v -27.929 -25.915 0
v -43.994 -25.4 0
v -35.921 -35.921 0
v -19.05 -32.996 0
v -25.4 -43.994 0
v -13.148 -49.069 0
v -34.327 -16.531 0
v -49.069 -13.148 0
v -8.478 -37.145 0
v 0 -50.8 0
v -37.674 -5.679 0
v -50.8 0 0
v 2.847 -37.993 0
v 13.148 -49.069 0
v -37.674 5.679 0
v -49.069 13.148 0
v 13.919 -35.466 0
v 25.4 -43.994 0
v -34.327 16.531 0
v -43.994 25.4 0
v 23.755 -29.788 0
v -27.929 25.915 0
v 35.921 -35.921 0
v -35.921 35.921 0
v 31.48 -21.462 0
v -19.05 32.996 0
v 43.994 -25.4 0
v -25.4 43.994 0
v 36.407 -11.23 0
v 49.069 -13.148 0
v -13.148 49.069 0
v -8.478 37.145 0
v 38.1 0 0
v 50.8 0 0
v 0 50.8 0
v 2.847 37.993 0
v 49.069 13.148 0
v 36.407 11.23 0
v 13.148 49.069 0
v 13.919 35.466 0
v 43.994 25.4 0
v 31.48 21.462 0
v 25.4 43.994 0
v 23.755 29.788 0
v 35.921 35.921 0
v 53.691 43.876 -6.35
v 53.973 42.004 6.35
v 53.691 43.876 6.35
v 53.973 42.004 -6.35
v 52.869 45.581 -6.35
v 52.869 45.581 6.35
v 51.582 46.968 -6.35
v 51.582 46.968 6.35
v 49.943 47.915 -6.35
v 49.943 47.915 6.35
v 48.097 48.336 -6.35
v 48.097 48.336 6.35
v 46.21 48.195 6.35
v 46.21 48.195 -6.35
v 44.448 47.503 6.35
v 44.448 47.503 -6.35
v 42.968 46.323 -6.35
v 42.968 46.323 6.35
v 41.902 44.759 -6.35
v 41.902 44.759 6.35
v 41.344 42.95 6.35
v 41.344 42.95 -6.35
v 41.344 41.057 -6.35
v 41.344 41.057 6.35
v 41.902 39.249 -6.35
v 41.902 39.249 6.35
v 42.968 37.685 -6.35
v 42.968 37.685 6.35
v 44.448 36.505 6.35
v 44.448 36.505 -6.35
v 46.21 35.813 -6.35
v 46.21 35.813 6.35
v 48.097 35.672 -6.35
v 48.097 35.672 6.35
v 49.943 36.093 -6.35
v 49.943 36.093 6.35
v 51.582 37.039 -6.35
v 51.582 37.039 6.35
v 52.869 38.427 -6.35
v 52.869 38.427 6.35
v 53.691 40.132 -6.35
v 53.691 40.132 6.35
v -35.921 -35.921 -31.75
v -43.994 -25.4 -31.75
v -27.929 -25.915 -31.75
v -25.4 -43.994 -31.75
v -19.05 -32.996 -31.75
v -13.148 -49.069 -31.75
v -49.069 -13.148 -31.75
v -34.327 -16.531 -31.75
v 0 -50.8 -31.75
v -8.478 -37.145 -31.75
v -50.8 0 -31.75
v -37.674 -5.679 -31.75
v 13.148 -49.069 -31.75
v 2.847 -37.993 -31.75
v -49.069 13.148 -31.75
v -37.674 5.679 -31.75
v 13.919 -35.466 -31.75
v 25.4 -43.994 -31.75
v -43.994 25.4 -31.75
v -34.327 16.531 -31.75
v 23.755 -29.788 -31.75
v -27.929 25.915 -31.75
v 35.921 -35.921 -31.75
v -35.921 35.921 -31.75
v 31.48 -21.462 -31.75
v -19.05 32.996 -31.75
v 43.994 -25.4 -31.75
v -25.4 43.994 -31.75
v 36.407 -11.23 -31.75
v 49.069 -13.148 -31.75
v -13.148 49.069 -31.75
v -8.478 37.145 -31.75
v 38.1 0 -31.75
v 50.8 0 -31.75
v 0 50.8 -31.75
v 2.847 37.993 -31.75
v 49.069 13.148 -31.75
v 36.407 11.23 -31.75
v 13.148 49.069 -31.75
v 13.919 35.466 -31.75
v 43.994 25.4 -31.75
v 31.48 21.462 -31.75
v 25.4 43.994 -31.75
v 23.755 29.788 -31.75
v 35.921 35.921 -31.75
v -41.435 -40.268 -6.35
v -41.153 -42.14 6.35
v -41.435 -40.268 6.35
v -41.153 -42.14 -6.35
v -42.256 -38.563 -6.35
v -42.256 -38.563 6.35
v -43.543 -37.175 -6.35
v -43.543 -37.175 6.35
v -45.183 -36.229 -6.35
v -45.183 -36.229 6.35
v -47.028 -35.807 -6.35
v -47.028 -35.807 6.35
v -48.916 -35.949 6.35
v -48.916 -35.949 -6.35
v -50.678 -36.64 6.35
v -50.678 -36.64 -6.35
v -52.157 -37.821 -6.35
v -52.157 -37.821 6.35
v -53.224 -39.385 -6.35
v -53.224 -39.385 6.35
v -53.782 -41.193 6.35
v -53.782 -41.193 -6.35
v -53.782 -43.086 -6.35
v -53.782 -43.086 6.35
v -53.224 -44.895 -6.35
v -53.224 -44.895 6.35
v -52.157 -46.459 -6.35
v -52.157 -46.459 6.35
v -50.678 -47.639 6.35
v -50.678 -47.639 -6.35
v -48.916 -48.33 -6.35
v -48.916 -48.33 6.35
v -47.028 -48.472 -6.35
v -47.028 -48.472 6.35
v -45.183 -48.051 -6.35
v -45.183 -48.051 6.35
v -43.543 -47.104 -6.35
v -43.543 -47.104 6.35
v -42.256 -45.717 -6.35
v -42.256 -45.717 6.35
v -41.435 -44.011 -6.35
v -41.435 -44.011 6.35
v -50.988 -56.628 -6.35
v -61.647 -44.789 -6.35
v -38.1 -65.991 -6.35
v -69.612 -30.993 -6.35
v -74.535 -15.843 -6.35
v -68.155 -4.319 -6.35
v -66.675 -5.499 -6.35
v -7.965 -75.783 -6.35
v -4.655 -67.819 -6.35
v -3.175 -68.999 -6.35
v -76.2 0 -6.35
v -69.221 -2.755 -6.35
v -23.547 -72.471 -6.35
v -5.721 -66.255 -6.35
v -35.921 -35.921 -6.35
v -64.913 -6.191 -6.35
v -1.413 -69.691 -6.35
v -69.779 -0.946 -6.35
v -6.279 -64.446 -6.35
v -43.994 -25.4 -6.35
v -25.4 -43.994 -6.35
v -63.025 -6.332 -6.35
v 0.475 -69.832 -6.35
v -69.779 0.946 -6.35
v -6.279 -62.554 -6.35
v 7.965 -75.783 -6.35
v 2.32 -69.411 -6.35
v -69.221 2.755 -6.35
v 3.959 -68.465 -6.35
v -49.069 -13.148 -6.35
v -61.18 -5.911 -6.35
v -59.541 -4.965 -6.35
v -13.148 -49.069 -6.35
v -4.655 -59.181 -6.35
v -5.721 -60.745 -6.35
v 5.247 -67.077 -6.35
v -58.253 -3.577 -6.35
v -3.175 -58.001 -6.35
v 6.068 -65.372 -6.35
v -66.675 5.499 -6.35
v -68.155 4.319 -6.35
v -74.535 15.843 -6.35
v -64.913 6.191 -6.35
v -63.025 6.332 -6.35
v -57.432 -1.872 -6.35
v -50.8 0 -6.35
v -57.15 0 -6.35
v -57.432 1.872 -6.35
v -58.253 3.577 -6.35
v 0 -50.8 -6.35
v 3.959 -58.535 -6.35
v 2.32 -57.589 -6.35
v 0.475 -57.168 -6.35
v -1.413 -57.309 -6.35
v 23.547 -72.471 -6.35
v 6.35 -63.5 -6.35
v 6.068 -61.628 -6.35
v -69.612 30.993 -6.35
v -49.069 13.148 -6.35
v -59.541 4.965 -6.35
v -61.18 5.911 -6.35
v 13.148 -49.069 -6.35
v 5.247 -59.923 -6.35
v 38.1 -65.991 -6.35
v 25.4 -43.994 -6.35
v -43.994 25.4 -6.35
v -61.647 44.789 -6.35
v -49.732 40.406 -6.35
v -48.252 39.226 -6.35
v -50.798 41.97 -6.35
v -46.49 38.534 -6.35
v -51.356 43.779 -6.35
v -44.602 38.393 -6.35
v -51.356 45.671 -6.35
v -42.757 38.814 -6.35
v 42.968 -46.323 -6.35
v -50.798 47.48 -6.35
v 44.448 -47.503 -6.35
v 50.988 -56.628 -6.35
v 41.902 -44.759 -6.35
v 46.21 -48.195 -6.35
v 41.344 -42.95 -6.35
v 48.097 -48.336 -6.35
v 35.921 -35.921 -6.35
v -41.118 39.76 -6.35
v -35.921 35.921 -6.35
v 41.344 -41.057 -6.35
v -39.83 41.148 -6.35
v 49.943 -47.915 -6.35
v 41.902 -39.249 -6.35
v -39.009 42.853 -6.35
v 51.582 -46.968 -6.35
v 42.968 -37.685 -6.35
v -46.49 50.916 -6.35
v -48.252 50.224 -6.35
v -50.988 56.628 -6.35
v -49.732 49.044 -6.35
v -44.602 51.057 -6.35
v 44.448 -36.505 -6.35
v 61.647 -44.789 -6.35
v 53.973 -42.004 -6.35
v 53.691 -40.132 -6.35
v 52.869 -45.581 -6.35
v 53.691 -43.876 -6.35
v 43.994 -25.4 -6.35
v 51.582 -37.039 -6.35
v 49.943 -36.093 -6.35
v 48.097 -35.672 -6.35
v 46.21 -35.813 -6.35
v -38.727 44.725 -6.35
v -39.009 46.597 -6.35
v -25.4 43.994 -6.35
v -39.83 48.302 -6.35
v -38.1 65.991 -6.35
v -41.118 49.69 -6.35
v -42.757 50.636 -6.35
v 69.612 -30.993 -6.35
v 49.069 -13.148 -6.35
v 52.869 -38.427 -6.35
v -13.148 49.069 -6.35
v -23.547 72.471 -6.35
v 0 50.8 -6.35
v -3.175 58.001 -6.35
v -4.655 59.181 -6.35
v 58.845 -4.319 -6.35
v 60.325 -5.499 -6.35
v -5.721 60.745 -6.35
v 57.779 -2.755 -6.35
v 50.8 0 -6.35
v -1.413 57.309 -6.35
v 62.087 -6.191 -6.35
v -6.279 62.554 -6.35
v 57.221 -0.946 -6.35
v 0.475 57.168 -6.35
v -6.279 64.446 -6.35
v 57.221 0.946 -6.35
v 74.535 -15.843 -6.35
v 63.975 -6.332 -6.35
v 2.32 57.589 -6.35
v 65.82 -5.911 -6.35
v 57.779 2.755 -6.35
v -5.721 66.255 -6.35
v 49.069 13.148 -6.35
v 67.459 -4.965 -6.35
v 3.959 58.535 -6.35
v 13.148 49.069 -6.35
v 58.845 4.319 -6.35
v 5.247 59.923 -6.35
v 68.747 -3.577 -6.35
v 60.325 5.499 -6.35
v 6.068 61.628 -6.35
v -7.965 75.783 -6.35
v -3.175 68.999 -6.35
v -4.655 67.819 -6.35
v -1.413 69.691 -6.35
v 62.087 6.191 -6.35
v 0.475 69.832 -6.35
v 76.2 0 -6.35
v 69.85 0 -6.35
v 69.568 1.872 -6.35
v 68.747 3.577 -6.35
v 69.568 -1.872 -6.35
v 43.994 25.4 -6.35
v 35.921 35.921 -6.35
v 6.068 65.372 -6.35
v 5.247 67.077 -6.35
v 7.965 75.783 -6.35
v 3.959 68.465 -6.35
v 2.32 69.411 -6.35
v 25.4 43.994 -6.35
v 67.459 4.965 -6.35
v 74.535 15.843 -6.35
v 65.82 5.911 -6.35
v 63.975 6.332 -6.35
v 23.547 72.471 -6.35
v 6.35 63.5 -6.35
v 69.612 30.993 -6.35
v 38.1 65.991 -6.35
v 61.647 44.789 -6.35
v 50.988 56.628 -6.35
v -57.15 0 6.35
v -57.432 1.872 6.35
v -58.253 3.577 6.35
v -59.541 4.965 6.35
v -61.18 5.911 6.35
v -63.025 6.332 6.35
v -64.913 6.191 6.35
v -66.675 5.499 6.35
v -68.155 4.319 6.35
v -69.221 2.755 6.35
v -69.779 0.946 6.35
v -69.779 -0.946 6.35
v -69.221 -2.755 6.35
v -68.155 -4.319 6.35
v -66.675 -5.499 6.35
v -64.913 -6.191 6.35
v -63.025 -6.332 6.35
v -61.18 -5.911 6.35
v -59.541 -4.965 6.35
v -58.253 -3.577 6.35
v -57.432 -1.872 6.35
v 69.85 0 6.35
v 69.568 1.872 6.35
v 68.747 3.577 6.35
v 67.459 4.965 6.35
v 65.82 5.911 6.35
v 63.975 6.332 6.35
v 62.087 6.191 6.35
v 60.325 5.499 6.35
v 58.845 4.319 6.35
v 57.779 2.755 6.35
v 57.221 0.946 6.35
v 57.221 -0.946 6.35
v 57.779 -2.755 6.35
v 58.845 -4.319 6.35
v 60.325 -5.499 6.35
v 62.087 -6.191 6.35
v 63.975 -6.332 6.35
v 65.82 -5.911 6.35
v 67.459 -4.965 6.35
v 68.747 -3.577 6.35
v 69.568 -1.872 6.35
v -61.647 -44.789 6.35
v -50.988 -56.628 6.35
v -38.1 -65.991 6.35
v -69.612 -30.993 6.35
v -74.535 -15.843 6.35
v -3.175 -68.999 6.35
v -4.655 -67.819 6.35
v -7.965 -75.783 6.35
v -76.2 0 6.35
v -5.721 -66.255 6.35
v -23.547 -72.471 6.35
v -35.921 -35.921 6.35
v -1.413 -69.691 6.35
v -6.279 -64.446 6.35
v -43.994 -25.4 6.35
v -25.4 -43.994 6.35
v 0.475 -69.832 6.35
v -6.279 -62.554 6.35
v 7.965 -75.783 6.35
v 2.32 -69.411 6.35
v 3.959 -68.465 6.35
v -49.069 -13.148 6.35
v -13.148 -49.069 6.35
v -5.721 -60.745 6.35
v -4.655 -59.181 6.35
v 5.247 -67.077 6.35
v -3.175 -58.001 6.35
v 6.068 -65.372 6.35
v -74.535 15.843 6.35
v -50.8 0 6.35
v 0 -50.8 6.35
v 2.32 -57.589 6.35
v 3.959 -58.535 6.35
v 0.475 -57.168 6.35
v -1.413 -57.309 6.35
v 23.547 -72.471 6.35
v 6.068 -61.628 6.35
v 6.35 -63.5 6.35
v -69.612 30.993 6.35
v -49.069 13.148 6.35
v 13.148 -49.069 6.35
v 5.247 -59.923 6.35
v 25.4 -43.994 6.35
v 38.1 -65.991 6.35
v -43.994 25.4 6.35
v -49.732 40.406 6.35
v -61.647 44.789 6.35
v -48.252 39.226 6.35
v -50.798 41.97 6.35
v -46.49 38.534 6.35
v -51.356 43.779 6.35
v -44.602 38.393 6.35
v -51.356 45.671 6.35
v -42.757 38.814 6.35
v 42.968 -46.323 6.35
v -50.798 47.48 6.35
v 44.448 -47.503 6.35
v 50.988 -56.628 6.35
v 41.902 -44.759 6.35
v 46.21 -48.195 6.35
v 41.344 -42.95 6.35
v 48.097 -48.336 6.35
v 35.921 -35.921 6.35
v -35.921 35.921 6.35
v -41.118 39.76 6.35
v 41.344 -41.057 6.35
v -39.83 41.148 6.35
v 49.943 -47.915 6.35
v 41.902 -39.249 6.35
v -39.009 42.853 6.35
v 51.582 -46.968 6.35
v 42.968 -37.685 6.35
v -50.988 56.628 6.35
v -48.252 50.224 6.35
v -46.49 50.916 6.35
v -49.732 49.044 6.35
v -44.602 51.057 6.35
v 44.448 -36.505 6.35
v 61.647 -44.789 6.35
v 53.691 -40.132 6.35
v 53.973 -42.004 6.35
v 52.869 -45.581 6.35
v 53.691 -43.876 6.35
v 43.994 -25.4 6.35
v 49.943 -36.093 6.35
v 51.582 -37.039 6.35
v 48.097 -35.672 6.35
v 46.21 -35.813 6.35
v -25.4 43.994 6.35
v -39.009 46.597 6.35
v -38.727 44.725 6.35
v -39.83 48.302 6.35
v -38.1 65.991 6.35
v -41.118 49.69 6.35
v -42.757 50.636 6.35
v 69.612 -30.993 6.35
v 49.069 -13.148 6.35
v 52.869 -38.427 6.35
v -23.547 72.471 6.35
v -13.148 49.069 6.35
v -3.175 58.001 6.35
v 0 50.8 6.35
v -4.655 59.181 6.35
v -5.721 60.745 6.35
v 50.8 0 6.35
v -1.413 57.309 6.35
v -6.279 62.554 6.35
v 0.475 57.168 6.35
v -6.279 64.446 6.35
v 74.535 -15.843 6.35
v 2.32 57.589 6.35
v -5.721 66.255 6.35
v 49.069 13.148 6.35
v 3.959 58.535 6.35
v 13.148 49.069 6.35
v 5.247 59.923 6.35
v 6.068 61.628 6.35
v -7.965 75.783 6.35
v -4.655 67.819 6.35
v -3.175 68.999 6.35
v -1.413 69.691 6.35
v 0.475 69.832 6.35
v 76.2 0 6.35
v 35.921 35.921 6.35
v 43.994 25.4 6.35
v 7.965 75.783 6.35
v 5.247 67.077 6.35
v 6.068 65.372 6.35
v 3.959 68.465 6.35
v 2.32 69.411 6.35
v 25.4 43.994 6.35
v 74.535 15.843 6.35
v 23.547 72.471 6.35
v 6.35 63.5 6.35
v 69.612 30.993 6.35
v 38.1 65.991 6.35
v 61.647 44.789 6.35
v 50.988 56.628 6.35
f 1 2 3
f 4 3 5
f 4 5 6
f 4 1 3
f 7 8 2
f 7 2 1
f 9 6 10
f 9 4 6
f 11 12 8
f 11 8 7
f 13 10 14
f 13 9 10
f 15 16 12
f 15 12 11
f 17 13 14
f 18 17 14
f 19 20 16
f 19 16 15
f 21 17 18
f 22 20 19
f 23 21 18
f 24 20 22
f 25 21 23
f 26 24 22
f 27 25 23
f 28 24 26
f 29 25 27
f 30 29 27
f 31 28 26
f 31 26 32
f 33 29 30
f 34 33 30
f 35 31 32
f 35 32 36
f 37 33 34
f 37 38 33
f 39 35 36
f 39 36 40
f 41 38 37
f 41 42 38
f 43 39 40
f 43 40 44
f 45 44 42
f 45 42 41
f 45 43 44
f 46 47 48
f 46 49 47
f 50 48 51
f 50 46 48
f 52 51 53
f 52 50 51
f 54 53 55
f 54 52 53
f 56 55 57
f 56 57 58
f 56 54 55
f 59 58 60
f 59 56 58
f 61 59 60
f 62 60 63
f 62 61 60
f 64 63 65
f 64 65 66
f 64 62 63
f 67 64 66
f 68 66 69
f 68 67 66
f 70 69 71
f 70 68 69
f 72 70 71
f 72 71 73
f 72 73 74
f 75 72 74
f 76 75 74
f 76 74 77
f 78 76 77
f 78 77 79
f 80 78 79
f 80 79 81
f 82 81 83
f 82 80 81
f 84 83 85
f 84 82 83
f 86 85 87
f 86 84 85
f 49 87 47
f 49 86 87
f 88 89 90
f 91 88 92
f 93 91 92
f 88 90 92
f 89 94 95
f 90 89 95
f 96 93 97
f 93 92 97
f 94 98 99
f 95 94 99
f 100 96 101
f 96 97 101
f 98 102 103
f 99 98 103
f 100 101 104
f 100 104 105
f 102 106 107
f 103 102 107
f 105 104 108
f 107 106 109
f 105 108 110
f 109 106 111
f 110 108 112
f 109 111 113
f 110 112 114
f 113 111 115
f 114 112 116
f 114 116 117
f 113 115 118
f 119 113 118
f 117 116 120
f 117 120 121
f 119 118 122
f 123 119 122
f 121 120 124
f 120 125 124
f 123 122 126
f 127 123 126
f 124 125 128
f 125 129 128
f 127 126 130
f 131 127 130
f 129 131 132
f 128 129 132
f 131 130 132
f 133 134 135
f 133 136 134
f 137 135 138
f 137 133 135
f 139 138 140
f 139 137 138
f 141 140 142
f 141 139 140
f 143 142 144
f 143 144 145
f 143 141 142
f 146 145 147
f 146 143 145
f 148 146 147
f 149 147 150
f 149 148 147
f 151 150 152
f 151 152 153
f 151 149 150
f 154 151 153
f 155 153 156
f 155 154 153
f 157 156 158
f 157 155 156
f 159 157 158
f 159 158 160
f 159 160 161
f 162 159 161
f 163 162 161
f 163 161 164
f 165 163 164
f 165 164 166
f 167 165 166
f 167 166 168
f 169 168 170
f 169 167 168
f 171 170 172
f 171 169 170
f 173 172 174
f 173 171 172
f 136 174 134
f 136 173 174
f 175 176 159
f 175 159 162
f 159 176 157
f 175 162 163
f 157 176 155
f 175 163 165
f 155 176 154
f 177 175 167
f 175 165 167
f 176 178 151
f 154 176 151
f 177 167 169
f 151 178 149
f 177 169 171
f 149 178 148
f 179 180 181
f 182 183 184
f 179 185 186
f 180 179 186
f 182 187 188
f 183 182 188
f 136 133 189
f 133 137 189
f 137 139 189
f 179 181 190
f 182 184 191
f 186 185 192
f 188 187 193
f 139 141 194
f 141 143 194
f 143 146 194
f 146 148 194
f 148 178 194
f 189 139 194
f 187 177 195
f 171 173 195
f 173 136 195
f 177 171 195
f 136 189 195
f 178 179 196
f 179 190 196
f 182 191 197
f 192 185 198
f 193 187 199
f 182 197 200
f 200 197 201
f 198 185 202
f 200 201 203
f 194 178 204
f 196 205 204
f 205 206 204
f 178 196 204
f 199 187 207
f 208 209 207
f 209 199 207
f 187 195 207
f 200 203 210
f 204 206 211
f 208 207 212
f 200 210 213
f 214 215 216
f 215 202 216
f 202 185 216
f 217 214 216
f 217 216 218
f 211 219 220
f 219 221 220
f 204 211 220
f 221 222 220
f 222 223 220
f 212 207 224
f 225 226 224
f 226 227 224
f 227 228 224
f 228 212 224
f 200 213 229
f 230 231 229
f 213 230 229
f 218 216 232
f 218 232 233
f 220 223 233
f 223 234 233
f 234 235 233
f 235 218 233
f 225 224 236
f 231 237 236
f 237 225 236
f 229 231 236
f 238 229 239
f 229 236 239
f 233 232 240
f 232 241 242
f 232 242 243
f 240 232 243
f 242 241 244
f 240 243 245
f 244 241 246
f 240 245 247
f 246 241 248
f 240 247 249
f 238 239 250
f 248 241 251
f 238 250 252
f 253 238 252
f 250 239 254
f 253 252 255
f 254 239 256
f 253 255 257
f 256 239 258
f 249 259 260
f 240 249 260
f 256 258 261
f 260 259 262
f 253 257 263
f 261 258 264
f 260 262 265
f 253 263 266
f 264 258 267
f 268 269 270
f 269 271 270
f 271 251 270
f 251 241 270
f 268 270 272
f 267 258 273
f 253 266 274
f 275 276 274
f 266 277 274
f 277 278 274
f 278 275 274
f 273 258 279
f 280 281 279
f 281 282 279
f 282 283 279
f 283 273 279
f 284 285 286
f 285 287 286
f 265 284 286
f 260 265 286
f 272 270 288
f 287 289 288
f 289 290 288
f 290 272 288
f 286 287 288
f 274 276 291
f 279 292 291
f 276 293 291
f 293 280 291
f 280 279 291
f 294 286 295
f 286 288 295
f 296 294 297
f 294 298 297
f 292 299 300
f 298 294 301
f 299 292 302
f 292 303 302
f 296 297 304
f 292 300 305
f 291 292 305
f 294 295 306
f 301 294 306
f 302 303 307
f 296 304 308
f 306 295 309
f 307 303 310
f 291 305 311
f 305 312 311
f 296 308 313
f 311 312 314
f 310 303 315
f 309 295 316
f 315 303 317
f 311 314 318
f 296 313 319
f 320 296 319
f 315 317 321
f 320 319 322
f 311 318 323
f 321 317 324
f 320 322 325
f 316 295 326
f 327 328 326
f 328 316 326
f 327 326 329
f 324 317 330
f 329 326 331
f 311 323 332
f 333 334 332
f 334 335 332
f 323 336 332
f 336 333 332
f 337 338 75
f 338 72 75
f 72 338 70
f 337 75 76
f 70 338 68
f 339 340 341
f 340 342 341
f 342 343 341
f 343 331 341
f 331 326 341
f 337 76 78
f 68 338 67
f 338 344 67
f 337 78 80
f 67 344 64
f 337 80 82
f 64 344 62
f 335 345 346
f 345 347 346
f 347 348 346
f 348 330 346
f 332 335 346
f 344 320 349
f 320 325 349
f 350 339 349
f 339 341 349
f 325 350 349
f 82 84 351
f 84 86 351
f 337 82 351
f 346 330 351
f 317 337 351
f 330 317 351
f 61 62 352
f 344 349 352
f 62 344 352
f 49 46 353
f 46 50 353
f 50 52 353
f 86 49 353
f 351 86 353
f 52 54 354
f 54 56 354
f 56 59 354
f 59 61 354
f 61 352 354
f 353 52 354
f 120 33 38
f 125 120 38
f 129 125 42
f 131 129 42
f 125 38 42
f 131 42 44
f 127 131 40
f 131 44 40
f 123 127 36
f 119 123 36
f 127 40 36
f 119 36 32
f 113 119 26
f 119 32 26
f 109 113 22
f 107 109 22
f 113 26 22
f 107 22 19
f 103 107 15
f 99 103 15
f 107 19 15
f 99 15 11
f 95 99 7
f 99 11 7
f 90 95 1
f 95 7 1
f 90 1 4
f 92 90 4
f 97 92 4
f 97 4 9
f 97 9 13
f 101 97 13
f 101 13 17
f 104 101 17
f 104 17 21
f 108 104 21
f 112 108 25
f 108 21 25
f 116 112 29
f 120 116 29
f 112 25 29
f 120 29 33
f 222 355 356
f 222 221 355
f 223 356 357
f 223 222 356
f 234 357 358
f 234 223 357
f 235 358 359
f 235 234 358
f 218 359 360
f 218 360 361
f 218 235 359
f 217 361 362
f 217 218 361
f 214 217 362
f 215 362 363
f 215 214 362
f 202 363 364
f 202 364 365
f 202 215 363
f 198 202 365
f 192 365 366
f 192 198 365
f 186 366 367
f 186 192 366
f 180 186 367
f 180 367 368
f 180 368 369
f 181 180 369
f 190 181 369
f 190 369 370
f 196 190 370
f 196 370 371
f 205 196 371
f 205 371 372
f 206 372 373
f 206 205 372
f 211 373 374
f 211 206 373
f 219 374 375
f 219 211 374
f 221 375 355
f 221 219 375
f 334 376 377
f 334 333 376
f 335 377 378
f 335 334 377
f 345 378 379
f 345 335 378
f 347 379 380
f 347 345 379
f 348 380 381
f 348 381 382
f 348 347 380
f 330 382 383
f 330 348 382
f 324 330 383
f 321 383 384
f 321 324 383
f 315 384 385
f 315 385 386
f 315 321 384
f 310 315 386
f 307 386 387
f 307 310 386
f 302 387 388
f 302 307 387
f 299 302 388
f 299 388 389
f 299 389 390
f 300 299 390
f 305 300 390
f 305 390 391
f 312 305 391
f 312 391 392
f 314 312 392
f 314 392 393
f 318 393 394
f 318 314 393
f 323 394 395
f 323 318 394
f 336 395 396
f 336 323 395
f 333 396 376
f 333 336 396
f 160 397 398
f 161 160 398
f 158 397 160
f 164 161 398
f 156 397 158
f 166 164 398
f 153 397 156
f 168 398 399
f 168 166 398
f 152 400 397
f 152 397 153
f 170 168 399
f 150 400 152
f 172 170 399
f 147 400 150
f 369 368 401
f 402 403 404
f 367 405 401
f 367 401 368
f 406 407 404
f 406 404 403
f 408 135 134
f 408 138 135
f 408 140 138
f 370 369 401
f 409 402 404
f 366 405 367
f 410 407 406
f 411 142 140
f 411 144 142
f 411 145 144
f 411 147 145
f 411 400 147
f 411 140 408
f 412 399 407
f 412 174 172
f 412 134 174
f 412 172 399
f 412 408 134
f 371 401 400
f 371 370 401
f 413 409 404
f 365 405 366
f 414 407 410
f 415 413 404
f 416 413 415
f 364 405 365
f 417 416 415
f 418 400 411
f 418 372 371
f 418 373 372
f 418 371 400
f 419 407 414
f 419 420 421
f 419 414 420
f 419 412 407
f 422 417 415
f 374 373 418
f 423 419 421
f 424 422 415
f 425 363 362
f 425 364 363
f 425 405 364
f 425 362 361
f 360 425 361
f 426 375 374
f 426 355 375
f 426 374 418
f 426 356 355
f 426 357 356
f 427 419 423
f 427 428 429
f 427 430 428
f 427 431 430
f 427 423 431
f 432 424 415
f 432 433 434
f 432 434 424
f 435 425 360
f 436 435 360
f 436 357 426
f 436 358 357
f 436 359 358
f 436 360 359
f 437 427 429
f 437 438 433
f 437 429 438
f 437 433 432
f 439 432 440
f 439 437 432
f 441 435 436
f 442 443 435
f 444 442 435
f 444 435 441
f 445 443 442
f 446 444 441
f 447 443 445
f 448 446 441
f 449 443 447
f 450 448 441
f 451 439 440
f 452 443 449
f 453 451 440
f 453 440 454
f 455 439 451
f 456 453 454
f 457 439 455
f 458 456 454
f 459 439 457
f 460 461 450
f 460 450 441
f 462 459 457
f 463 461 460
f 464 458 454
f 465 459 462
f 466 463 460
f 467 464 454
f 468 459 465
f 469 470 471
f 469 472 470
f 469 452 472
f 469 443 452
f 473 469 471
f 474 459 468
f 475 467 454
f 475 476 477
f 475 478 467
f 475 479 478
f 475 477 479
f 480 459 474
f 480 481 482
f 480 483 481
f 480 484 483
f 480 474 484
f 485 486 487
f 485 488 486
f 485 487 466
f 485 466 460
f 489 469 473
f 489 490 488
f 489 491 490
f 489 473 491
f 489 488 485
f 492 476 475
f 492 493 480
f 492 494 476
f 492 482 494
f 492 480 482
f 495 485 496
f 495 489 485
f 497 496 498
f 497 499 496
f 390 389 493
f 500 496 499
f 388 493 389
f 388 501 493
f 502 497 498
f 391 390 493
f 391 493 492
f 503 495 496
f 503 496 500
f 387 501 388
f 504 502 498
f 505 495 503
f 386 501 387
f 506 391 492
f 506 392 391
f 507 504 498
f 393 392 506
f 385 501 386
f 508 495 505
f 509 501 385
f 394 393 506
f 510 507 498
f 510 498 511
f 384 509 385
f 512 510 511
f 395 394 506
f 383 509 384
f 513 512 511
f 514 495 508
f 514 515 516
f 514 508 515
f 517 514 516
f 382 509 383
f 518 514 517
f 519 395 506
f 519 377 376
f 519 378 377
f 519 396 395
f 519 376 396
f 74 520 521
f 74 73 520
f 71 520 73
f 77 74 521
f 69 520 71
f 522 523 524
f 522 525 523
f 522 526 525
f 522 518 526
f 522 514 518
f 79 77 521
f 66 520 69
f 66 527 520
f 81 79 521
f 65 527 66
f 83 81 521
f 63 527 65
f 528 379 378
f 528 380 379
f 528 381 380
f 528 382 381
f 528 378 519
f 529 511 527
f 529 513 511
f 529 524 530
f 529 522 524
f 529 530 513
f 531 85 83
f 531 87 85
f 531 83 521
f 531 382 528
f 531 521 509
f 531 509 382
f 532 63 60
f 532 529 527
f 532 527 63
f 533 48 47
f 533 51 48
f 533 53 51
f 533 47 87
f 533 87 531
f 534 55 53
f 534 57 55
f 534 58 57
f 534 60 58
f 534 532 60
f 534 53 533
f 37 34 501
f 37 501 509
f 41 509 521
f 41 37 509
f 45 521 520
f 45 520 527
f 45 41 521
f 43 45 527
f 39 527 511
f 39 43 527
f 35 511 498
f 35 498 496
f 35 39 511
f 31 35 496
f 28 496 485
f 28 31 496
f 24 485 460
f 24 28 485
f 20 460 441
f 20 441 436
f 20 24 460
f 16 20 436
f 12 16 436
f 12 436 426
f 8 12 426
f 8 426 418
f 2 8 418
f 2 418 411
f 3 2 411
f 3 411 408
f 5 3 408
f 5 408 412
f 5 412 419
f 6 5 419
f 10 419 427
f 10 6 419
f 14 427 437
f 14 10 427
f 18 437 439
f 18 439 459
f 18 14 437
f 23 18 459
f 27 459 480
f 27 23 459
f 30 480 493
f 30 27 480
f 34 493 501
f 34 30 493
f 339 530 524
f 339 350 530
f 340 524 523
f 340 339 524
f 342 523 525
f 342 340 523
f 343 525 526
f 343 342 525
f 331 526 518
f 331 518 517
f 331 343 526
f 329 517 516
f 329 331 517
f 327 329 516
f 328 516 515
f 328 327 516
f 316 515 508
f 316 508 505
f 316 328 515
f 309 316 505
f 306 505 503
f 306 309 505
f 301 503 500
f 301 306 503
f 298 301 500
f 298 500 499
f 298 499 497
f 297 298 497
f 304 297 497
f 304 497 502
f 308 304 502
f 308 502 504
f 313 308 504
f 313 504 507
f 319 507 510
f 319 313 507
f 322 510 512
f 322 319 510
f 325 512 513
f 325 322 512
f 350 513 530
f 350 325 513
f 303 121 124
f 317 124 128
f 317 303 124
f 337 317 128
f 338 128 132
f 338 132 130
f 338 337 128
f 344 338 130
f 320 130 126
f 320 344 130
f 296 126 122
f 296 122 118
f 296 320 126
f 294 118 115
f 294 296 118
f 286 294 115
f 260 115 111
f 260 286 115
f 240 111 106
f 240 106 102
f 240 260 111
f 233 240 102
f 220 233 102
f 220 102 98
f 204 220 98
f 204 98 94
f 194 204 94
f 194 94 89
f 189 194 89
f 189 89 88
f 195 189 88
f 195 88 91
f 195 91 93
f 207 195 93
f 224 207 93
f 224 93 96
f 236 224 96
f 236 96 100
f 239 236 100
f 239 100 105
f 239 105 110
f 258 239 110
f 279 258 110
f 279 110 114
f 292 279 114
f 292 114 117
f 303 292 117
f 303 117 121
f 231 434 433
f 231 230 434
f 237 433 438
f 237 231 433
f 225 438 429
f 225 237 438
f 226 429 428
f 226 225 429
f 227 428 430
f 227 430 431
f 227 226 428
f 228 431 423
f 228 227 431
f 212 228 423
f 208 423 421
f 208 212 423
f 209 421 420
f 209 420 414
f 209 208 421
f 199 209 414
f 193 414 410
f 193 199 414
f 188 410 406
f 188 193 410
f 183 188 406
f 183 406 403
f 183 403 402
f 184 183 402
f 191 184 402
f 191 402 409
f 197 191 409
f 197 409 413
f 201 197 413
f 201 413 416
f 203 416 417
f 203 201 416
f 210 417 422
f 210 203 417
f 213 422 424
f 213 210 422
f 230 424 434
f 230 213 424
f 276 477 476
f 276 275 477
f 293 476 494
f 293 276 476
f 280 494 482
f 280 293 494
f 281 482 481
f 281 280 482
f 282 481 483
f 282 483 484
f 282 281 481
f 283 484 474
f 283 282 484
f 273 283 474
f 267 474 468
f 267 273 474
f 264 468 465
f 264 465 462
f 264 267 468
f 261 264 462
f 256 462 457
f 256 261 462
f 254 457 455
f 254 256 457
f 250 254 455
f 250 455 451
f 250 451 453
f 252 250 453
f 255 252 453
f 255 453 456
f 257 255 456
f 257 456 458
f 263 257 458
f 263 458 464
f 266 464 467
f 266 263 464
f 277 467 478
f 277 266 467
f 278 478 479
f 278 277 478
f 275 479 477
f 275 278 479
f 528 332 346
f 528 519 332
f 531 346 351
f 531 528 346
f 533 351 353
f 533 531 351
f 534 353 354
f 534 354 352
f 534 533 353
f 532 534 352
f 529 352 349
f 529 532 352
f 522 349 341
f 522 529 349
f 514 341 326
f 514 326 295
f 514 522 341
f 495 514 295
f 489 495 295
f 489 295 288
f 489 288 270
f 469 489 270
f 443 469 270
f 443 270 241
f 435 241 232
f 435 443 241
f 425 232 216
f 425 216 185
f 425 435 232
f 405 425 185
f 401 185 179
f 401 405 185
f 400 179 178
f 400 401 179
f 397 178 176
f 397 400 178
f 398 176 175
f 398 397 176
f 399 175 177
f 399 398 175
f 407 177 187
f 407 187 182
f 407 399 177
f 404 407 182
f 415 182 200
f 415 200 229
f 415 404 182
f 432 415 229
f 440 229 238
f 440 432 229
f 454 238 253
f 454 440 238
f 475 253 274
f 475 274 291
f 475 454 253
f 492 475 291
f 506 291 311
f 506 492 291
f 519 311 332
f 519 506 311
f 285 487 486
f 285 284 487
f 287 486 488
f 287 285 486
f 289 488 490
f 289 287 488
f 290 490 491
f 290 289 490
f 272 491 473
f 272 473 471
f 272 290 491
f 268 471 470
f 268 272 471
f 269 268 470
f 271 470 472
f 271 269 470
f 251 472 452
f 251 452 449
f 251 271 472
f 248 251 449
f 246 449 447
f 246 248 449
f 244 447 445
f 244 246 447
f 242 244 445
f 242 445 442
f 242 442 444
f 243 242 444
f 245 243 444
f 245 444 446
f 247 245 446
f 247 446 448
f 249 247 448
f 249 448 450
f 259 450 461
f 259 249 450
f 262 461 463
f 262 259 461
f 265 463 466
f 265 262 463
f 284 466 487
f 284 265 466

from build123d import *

# Parameters (mm, degrees)
F0_R     = 50.8
F0_R_2   = 38.1
F1_DEPTH = 31.75
F0_R_3   = 76.2
F0_R_4   = 6.35
F2_DEPTH = 6.35


with BuildPart() as f1:
    # F0 (on Top) → F1 (new body)
    with BuildSketch(Plane.XY):
        Circle(F0_R)
        Circle(F0_R_2, mode=Mode.SUBTRACT)
    extrude(amount=-F1_DEPTH)

    # F0 (on Top) → F2 (join, symmetric)
    with BuildSketch(Plane.XY):
        Circle(F0_R_3)
        with Locations((-47.502615, -42.139667)):
            Circle(F0_R_4, mode=Mode.SUBTRACT)
        with Locations((0, -63.5)):
            Circle(F0_R_4, mode=Mode.SUBTRACT)
        with Locations((47.622745, -42.003859)):
            Circle(F0_R_4, mode=Mode.SUBTRACT)
        with Locations((-63.5, 0)):
            Circle(F0_R_4, mode=Mode.SUBTRACT)
        with Locations((-45.076814, 44.725058)):
            Circle(F0_R_4, mode=Mode.SUBTRACT)
        Circle(F0_R, mode=Mode.SUBTRACT)
        with Locations((63.5, 0)):
            Circle(F0_R_4, mode=Mode.SUBTRACT)
        with Locations((0, 63.5)):
            Circle(F0_R_4, mode=Mode.SUBTRACT)
        with Locations((47.622745, 42.003859)):
            Circle(F0_R_4, mode=Mode.SUBTRACT)
    extrude(amount=F2_DEPTH, both=True)


solid = f1.part
